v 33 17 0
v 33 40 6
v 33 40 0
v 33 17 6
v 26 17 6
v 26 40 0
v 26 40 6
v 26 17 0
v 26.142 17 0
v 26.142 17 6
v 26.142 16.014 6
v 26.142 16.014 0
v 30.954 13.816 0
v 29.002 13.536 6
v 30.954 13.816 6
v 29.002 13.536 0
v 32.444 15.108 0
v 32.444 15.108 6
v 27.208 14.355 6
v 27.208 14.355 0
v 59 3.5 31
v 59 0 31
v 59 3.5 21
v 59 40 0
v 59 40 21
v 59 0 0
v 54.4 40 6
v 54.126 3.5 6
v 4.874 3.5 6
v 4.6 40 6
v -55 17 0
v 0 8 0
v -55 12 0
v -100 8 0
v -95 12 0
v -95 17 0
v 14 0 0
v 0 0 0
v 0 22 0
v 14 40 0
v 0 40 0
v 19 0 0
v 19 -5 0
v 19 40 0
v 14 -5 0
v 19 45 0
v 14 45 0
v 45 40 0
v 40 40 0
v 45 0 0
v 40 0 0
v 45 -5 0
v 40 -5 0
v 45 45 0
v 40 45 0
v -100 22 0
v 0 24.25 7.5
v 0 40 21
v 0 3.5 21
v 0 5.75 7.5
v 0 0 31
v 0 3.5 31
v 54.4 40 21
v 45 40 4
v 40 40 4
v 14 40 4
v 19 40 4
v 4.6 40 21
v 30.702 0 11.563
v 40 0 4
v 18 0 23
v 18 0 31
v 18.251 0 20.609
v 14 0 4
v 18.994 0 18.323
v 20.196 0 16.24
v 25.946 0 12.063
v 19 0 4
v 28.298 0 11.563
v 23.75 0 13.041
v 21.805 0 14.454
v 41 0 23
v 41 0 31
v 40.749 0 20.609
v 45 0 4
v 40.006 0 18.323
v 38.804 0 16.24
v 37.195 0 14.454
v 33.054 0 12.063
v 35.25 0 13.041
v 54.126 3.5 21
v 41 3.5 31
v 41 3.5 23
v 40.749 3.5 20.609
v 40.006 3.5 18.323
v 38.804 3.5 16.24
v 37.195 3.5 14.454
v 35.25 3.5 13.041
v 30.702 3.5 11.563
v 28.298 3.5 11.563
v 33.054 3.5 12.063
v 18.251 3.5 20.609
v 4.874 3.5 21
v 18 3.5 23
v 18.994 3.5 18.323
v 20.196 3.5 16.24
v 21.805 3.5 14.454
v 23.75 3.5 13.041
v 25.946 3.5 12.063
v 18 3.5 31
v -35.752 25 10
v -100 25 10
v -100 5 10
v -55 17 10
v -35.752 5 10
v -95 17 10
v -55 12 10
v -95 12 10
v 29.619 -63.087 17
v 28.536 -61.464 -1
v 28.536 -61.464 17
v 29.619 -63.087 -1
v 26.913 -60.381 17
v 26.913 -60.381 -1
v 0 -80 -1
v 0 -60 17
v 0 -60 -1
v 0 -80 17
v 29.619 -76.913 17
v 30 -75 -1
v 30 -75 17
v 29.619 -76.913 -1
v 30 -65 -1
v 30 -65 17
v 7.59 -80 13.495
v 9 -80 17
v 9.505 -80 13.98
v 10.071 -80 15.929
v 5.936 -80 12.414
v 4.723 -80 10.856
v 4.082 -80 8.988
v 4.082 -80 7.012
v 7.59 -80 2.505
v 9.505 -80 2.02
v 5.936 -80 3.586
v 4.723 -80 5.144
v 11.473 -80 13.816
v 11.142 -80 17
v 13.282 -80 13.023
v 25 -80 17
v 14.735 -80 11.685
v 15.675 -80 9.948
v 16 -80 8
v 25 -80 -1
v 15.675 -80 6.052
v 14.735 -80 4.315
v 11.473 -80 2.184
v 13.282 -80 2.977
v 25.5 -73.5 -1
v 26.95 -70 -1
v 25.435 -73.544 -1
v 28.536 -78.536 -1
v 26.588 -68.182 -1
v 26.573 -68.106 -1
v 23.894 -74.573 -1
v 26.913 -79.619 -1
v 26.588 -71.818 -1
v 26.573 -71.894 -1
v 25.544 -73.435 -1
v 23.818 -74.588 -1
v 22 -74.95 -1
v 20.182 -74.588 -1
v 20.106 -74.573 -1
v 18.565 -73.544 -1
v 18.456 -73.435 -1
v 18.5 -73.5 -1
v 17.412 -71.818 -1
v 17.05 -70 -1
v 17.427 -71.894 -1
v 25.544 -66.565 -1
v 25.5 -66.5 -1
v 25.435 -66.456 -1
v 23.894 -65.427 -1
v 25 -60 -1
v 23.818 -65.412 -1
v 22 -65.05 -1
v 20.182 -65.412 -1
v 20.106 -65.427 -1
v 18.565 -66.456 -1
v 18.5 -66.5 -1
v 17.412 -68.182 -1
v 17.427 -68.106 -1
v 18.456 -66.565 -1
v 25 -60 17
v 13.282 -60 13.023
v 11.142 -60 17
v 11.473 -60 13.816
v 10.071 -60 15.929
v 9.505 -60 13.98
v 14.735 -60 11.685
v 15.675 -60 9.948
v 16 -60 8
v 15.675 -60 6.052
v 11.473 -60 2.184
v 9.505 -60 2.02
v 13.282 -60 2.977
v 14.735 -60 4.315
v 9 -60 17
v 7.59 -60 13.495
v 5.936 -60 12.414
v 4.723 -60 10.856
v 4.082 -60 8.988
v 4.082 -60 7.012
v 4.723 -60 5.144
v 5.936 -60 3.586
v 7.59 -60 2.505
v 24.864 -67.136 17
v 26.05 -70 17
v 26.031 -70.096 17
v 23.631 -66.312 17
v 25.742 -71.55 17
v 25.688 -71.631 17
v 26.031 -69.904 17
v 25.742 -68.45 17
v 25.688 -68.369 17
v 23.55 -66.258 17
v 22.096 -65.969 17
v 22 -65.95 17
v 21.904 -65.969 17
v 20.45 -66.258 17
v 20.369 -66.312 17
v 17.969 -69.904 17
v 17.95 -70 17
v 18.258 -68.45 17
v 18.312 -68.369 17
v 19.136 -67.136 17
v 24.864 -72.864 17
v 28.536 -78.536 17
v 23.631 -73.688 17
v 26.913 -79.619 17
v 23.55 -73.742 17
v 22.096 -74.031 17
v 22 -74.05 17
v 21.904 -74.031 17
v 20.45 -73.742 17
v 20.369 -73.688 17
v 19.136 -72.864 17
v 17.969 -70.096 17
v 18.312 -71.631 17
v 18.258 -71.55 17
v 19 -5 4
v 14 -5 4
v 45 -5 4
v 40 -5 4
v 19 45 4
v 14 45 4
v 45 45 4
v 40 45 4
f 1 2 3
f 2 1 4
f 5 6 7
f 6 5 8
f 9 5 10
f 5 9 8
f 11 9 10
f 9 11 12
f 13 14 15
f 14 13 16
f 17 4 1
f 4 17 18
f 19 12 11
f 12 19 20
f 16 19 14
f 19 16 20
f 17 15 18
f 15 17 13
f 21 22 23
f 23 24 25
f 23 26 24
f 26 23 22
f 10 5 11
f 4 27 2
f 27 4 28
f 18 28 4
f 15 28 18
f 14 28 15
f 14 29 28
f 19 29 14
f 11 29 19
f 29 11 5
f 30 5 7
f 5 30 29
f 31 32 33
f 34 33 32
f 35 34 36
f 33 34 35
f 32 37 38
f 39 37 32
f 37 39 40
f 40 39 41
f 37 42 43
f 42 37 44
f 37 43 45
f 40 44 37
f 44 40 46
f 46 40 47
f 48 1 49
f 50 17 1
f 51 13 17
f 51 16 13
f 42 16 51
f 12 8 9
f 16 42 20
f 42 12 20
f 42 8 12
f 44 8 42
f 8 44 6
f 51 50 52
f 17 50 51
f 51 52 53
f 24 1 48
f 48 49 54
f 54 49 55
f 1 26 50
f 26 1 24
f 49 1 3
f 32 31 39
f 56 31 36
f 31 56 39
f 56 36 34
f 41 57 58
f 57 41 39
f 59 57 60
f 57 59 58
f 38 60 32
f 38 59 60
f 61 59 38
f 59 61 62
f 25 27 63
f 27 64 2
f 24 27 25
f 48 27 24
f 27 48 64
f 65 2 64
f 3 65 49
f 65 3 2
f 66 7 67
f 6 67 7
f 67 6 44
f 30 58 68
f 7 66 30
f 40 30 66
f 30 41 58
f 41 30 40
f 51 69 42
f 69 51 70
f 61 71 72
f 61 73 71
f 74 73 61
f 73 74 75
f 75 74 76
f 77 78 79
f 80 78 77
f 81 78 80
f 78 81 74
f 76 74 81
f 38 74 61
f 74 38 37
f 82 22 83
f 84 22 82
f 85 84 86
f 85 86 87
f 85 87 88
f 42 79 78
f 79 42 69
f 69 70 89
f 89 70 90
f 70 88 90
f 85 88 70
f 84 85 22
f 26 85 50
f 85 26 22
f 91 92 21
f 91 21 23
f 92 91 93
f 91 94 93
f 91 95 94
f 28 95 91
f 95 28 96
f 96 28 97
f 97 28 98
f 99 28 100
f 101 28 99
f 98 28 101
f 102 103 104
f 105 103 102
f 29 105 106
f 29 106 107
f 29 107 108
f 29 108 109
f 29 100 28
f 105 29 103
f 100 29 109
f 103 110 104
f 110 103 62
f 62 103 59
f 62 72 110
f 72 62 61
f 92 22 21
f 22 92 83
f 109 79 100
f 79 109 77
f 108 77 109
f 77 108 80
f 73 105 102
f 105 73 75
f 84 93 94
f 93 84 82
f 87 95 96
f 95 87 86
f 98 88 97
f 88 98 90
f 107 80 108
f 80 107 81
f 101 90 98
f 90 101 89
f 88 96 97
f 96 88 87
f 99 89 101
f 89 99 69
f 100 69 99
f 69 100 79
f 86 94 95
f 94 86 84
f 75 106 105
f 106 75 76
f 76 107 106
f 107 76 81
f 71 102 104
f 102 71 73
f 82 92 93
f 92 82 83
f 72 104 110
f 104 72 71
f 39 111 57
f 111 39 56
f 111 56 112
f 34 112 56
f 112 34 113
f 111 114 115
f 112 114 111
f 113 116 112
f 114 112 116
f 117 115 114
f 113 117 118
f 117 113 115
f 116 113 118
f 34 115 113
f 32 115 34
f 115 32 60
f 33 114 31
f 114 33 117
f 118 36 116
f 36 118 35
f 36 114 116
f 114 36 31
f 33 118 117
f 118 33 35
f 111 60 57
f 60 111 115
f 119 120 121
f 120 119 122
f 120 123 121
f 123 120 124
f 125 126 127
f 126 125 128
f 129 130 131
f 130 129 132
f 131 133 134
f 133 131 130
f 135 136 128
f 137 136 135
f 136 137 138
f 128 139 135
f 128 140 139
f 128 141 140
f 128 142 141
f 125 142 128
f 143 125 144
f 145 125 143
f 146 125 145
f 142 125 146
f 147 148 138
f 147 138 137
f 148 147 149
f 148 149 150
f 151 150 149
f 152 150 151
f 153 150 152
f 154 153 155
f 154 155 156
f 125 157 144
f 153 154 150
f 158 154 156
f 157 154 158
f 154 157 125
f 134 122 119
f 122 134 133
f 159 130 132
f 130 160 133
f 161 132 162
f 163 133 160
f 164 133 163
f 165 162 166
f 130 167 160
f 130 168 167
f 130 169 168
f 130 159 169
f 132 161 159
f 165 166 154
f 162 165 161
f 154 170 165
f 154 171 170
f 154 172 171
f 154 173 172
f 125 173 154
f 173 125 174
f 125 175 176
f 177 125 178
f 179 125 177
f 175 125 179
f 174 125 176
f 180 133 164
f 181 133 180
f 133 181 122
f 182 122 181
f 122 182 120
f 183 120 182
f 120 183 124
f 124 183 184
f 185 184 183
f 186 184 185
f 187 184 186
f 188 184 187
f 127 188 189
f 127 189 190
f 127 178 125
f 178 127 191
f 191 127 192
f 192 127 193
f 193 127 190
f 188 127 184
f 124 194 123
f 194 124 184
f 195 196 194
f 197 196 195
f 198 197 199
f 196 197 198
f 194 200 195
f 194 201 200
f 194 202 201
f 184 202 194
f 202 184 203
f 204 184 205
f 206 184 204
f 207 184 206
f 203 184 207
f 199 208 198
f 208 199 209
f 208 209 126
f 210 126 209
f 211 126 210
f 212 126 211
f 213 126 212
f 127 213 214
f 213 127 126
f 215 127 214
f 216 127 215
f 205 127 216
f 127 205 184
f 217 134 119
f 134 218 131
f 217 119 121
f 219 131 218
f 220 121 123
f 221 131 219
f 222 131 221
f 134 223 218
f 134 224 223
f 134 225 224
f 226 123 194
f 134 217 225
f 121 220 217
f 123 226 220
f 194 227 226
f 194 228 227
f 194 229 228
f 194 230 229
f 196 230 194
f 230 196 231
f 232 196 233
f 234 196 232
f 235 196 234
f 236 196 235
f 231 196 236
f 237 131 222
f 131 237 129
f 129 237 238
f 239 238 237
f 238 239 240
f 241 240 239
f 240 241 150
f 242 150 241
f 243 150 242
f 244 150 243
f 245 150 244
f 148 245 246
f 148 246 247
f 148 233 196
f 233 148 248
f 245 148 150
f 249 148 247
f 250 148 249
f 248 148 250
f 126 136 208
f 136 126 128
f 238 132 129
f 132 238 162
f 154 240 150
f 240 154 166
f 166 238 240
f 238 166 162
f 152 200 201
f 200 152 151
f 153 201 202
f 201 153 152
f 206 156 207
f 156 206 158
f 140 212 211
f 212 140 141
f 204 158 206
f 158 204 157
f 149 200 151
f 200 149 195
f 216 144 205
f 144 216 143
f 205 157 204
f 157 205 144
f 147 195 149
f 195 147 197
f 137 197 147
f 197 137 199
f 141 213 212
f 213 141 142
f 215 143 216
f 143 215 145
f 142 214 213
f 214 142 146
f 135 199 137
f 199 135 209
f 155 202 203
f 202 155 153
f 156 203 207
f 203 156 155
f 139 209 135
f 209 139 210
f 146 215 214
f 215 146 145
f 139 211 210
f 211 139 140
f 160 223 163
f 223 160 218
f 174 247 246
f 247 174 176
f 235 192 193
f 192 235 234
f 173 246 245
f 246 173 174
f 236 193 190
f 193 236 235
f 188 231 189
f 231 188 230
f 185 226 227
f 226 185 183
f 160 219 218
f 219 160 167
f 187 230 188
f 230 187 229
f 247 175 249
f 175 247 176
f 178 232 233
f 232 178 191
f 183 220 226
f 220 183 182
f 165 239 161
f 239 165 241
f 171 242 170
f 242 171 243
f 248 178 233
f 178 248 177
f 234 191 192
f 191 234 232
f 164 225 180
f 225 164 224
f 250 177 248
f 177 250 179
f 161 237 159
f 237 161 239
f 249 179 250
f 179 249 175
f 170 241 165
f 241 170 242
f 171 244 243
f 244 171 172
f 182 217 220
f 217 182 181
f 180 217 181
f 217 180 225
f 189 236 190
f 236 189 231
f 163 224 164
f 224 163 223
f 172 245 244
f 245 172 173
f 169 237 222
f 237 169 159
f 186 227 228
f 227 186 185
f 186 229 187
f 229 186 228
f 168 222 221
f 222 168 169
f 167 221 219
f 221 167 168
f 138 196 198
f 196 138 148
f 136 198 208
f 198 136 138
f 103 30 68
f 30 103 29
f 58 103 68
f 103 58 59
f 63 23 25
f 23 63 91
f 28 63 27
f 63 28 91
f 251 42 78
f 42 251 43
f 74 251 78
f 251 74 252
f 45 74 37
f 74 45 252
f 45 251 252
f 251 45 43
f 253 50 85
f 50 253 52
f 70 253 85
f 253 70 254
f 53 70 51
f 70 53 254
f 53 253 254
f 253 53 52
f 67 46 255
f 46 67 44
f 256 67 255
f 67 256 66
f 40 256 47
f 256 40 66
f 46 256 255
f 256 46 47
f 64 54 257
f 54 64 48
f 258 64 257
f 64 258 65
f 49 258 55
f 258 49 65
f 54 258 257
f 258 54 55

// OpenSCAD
// camera
*translate([5,5,6]) cube([49,26,35.5]);

//baseplate
difference(){
	cube([59,40,6]);
	color("green")translate([26,17,-1]){
		cube([7,26,8]);
		translate([3.5,0,0])cylinder(8,3.5,3.5);
	}
}
//front wall
difference(){
	union(){
		color("green")translate([0,0,6])cube([59,3.5,5]);
		translate([0,0,11])cube([59,3.5,20]);
	}
	color("red") translate([29.5,4,23]) rotate([90,0,0])cylinder(5,11.5,11.5);
	color("blue") translate([18,-1,23])cube([23,5,20]);
}
//left wall
color("red")translate([0,0,6]){
	linear_extrude(height=15, center=false, convexity=14, twist=0)
	polygon( [ [0,0],[0,40],[4.6,40],[4.9,0] ] );
}
//right wall
color("red")translate([59,0,6]){
	linear_extrude(height=15, center=false, convexity=14, twist=0)
	polygon( [ [0,0],[0,40],[-4.6,40],[-4.9,0] ] );
}

//elastics mounting points
translate([14,-5,])cube([5,5,4]);
translate([40,-5,])cube([5,5,4]);
translate([14,40,])cube([5,5,4]);
translate([40,40,])cube([5,5,4]);

//laser arm
paths = [[0,0],[3,10],[17,10],[20,0]];
difference(){
    color("green") translate([-50,25,10]) rotate([90,180,90]){
        linear_extrude(height = 100, center = true, convexity = 14, twist = 0) 
        polygon(paths);
    }
    color("blue") translate([-95,12,-5]) cube([40,5,17]);
    color("purple") translate([0,3,7.5])rotate([0,-86,0]) cube([5,25,40]);
}


// laser holder
translate([0,-80,8]){
    difference(){
        linear_extrude(height = 18, center = true, convexity = 14, twist = 0)hull(){
            square([10,20]);
            translate([25,5,0]) circle(5);
            translate([25,15,0]) circle(5);
        }
        translate([10,25,0])rotate([90,0,0])cylinder(30,6,6);
        translate([22,10,-10]) cylinder(20,5,4);
        color("red")translate([3,-5,15]) rotate([0,45,0]) cube([10,30,10]);
    }
    
}
